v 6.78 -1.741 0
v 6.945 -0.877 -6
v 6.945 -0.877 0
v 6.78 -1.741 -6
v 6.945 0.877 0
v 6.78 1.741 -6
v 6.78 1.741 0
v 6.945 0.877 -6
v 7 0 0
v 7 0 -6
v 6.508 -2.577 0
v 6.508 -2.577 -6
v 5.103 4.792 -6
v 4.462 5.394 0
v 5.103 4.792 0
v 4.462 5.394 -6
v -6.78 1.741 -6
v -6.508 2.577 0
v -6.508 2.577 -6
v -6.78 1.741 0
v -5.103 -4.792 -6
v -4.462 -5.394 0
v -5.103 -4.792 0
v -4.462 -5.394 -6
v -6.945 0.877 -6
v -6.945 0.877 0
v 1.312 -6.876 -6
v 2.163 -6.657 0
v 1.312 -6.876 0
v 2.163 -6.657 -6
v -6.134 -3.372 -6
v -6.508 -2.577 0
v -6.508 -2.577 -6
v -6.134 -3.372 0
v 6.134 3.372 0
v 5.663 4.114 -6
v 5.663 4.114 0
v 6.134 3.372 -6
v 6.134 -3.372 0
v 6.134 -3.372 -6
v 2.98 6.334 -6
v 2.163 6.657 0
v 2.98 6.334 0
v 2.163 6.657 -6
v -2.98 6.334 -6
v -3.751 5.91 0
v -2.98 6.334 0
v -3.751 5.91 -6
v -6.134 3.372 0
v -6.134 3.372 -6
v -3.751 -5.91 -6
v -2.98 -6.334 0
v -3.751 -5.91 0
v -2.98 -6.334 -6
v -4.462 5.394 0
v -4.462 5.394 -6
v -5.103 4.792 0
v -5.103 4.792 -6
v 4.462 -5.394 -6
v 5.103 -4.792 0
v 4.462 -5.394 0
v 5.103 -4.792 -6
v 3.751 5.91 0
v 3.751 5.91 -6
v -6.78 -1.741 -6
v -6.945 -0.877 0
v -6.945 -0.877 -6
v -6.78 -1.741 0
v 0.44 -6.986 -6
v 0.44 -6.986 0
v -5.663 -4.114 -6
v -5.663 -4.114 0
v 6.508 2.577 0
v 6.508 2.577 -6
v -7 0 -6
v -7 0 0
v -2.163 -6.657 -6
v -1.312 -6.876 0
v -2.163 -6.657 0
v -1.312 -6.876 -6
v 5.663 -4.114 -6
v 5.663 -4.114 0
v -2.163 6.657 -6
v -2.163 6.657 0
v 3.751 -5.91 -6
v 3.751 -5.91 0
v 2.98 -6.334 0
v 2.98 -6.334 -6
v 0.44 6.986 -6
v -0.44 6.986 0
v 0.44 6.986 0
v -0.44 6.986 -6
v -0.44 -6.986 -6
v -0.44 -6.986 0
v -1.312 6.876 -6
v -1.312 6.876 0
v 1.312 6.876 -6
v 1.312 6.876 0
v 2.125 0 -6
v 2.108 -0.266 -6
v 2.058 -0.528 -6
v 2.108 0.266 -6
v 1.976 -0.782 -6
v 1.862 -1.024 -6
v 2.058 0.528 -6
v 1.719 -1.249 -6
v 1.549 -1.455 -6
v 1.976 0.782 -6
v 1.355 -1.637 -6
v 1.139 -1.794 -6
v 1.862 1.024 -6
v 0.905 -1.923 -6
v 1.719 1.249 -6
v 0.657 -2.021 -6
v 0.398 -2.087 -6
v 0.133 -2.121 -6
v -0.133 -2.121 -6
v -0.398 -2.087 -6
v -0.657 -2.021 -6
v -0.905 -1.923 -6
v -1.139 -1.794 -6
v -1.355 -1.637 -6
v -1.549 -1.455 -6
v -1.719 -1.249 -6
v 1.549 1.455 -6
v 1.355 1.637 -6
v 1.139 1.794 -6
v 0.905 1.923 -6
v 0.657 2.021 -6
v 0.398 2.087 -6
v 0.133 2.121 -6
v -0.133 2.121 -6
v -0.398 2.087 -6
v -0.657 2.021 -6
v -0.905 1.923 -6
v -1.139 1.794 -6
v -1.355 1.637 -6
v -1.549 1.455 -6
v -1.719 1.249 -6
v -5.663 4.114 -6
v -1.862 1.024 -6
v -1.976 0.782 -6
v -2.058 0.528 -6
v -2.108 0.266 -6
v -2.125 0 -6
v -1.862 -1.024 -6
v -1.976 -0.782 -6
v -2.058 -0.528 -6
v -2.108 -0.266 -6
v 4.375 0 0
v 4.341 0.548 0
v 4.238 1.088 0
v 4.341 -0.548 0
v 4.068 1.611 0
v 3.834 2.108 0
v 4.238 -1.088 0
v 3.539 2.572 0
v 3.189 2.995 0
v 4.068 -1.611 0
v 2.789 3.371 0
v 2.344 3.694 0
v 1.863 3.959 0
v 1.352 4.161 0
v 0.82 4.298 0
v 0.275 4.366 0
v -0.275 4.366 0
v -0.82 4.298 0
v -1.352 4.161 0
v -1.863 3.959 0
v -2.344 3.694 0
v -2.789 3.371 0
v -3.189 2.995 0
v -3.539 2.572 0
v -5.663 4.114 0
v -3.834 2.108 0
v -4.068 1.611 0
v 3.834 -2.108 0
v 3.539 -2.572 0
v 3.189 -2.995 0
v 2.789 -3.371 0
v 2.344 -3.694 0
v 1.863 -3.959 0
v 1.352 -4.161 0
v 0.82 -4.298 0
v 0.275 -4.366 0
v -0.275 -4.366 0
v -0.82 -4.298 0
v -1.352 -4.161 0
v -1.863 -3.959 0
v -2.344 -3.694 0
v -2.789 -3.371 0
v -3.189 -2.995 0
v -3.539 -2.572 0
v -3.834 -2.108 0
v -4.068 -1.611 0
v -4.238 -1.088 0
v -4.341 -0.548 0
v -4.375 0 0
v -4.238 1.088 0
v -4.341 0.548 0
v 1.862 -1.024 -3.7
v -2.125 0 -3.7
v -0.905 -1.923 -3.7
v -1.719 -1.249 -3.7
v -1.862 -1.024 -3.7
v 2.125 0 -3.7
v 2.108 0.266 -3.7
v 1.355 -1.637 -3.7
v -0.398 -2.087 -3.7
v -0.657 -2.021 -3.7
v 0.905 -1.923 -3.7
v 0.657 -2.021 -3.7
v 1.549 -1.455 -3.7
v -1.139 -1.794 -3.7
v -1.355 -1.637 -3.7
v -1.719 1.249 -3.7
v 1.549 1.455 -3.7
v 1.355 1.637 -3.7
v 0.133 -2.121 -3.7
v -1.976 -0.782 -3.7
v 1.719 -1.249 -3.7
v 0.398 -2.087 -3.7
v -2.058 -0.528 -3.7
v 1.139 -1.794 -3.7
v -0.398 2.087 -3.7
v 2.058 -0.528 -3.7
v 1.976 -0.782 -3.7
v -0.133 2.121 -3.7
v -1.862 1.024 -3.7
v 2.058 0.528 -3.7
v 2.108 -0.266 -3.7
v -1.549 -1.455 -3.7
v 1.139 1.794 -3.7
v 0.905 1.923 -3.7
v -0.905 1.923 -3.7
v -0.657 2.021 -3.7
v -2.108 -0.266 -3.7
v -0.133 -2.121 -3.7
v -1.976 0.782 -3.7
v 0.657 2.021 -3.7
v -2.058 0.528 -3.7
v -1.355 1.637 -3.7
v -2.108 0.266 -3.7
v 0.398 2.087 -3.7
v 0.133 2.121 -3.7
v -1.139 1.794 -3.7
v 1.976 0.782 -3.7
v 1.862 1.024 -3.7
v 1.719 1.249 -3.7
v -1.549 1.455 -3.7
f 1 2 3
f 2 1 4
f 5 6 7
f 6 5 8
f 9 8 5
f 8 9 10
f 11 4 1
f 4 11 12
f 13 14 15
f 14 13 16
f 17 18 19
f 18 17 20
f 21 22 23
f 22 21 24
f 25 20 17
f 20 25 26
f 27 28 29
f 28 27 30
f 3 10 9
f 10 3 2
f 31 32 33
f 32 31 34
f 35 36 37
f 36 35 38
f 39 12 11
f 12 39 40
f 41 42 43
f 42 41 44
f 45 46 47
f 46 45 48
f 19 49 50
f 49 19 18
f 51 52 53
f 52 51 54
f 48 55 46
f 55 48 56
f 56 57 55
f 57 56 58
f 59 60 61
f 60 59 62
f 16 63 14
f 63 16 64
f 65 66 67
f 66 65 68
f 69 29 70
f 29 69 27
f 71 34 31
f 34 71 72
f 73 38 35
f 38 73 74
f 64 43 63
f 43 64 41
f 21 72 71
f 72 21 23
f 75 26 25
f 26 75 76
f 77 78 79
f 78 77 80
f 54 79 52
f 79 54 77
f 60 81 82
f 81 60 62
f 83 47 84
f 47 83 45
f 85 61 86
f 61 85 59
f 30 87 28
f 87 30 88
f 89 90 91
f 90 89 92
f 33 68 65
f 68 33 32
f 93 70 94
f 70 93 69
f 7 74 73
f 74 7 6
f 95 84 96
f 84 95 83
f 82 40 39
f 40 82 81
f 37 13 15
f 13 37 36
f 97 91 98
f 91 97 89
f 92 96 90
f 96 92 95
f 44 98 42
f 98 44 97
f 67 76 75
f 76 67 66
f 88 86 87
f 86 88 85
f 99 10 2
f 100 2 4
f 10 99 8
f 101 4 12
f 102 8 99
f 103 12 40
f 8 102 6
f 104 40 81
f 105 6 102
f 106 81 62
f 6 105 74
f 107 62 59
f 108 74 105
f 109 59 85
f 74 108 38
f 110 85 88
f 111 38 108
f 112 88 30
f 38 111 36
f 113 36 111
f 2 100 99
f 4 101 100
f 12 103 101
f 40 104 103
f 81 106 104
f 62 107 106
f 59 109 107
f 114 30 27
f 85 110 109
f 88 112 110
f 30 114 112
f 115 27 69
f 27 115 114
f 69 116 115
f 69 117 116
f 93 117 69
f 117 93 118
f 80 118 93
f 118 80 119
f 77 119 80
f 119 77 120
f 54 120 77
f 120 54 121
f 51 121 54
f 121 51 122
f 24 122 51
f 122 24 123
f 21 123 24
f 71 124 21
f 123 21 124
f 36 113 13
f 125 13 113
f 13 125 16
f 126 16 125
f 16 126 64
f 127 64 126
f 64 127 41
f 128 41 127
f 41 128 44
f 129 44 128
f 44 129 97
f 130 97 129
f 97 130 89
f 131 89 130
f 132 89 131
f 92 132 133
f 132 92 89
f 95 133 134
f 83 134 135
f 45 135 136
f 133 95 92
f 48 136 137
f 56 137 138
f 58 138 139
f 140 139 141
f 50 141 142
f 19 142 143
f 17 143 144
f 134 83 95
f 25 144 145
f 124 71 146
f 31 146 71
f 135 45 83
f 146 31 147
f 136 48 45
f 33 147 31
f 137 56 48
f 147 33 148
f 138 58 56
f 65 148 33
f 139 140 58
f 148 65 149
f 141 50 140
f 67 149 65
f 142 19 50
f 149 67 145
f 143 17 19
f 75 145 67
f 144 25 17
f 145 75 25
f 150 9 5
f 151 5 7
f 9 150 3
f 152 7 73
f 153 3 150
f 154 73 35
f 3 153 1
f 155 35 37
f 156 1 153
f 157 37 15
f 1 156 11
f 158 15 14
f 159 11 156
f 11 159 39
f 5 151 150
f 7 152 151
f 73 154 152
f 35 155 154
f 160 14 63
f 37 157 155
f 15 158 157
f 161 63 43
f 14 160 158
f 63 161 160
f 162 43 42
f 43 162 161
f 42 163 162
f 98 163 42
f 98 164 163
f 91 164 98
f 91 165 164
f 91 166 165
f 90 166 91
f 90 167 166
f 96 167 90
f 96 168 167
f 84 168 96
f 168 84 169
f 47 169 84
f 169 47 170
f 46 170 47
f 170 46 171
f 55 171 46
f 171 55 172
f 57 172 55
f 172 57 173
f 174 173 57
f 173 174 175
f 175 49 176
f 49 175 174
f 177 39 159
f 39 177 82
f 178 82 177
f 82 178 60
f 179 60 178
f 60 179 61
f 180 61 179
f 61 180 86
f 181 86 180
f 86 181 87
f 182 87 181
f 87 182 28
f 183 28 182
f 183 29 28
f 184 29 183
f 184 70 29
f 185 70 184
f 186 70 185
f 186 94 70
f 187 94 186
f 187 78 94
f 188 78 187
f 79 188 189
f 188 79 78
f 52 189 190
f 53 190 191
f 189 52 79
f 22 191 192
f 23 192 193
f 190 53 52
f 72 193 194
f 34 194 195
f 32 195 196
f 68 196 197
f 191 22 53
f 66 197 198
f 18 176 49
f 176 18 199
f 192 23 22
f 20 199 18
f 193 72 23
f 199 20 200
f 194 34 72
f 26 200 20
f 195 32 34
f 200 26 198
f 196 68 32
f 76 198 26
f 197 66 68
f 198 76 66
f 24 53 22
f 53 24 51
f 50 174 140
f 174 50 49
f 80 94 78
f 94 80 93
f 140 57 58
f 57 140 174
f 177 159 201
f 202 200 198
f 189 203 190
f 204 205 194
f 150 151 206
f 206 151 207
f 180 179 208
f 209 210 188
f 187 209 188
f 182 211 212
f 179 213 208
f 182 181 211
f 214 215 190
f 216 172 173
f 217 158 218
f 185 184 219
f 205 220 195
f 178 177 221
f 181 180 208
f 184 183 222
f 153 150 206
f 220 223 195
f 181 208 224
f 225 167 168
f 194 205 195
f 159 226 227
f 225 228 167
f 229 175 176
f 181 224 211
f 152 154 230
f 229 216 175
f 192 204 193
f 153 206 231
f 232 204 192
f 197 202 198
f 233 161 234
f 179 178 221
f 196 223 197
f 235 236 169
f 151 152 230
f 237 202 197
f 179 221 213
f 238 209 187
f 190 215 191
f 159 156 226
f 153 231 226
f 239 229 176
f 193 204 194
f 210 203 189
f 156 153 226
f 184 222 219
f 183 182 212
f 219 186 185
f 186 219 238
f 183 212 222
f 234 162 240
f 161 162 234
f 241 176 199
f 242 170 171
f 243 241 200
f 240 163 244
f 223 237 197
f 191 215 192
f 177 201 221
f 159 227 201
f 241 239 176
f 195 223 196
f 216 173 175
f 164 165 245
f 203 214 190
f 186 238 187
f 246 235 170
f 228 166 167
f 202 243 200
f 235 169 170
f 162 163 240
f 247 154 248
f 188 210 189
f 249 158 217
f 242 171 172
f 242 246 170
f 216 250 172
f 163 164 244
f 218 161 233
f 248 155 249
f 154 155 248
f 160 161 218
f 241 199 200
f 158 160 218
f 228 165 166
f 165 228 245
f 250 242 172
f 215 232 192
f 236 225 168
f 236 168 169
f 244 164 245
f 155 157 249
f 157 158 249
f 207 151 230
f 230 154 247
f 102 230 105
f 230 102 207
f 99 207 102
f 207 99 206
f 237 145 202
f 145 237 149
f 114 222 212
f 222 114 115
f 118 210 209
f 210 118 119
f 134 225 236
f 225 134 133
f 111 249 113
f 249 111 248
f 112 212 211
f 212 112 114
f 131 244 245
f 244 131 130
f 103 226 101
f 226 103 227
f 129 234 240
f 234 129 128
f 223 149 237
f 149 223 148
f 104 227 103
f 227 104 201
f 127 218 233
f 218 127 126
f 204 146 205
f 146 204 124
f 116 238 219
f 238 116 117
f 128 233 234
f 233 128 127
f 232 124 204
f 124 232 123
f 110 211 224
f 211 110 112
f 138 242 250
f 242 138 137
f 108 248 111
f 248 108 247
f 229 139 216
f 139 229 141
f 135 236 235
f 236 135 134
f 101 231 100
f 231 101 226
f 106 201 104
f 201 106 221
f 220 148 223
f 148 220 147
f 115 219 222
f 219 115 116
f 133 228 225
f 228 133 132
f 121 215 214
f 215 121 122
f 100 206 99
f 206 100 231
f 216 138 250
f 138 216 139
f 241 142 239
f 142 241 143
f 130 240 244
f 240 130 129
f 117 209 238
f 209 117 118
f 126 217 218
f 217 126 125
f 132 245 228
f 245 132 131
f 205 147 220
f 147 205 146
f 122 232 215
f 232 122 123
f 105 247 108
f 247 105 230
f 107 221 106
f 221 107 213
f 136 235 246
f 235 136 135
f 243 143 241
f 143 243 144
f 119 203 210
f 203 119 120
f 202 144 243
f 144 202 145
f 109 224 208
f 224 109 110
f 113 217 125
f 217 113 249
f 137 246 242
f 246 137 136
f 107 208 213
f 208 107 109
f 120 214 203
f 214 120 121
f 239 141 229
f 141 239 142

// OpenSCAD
$fn = 50;


difference() {
	union() {
		translate(v = [0, 0, -6.0000000000]) {
			cylinder(h = 6, r = 7.0000000000);
		}
		translate(v = [0, 0, -6.0000000000]) {
			cylinder(h = 6, r = 2.8750000000);
		}
	}
	union() {
		translate(v = [0, 0, 0]) {
			rotate(a = [0, 0, 0]) {
				difference() {
					union() {
						translate(v = [0, 0, -6.0000000000]) {
							cylinder(h = 6, r = 2.0000000000);
						}
						translate(v = [0, 0, -3.7000000000]) {
							cylinder(h = 3.7000000000, r1 = 2.1250000000, r2 = 4.3750000000);
						}
						translate(v = [0, 0, -6.0000000000]) {
							cylinder(h = 6, r = 2.1250000000);
						}
						translate(v = [0, 0, -6.0000000000]) {
							cylinder(h = 6, r = 2.0000000000);
						}
					}
					union();
				}
			}
		}
	}
}
